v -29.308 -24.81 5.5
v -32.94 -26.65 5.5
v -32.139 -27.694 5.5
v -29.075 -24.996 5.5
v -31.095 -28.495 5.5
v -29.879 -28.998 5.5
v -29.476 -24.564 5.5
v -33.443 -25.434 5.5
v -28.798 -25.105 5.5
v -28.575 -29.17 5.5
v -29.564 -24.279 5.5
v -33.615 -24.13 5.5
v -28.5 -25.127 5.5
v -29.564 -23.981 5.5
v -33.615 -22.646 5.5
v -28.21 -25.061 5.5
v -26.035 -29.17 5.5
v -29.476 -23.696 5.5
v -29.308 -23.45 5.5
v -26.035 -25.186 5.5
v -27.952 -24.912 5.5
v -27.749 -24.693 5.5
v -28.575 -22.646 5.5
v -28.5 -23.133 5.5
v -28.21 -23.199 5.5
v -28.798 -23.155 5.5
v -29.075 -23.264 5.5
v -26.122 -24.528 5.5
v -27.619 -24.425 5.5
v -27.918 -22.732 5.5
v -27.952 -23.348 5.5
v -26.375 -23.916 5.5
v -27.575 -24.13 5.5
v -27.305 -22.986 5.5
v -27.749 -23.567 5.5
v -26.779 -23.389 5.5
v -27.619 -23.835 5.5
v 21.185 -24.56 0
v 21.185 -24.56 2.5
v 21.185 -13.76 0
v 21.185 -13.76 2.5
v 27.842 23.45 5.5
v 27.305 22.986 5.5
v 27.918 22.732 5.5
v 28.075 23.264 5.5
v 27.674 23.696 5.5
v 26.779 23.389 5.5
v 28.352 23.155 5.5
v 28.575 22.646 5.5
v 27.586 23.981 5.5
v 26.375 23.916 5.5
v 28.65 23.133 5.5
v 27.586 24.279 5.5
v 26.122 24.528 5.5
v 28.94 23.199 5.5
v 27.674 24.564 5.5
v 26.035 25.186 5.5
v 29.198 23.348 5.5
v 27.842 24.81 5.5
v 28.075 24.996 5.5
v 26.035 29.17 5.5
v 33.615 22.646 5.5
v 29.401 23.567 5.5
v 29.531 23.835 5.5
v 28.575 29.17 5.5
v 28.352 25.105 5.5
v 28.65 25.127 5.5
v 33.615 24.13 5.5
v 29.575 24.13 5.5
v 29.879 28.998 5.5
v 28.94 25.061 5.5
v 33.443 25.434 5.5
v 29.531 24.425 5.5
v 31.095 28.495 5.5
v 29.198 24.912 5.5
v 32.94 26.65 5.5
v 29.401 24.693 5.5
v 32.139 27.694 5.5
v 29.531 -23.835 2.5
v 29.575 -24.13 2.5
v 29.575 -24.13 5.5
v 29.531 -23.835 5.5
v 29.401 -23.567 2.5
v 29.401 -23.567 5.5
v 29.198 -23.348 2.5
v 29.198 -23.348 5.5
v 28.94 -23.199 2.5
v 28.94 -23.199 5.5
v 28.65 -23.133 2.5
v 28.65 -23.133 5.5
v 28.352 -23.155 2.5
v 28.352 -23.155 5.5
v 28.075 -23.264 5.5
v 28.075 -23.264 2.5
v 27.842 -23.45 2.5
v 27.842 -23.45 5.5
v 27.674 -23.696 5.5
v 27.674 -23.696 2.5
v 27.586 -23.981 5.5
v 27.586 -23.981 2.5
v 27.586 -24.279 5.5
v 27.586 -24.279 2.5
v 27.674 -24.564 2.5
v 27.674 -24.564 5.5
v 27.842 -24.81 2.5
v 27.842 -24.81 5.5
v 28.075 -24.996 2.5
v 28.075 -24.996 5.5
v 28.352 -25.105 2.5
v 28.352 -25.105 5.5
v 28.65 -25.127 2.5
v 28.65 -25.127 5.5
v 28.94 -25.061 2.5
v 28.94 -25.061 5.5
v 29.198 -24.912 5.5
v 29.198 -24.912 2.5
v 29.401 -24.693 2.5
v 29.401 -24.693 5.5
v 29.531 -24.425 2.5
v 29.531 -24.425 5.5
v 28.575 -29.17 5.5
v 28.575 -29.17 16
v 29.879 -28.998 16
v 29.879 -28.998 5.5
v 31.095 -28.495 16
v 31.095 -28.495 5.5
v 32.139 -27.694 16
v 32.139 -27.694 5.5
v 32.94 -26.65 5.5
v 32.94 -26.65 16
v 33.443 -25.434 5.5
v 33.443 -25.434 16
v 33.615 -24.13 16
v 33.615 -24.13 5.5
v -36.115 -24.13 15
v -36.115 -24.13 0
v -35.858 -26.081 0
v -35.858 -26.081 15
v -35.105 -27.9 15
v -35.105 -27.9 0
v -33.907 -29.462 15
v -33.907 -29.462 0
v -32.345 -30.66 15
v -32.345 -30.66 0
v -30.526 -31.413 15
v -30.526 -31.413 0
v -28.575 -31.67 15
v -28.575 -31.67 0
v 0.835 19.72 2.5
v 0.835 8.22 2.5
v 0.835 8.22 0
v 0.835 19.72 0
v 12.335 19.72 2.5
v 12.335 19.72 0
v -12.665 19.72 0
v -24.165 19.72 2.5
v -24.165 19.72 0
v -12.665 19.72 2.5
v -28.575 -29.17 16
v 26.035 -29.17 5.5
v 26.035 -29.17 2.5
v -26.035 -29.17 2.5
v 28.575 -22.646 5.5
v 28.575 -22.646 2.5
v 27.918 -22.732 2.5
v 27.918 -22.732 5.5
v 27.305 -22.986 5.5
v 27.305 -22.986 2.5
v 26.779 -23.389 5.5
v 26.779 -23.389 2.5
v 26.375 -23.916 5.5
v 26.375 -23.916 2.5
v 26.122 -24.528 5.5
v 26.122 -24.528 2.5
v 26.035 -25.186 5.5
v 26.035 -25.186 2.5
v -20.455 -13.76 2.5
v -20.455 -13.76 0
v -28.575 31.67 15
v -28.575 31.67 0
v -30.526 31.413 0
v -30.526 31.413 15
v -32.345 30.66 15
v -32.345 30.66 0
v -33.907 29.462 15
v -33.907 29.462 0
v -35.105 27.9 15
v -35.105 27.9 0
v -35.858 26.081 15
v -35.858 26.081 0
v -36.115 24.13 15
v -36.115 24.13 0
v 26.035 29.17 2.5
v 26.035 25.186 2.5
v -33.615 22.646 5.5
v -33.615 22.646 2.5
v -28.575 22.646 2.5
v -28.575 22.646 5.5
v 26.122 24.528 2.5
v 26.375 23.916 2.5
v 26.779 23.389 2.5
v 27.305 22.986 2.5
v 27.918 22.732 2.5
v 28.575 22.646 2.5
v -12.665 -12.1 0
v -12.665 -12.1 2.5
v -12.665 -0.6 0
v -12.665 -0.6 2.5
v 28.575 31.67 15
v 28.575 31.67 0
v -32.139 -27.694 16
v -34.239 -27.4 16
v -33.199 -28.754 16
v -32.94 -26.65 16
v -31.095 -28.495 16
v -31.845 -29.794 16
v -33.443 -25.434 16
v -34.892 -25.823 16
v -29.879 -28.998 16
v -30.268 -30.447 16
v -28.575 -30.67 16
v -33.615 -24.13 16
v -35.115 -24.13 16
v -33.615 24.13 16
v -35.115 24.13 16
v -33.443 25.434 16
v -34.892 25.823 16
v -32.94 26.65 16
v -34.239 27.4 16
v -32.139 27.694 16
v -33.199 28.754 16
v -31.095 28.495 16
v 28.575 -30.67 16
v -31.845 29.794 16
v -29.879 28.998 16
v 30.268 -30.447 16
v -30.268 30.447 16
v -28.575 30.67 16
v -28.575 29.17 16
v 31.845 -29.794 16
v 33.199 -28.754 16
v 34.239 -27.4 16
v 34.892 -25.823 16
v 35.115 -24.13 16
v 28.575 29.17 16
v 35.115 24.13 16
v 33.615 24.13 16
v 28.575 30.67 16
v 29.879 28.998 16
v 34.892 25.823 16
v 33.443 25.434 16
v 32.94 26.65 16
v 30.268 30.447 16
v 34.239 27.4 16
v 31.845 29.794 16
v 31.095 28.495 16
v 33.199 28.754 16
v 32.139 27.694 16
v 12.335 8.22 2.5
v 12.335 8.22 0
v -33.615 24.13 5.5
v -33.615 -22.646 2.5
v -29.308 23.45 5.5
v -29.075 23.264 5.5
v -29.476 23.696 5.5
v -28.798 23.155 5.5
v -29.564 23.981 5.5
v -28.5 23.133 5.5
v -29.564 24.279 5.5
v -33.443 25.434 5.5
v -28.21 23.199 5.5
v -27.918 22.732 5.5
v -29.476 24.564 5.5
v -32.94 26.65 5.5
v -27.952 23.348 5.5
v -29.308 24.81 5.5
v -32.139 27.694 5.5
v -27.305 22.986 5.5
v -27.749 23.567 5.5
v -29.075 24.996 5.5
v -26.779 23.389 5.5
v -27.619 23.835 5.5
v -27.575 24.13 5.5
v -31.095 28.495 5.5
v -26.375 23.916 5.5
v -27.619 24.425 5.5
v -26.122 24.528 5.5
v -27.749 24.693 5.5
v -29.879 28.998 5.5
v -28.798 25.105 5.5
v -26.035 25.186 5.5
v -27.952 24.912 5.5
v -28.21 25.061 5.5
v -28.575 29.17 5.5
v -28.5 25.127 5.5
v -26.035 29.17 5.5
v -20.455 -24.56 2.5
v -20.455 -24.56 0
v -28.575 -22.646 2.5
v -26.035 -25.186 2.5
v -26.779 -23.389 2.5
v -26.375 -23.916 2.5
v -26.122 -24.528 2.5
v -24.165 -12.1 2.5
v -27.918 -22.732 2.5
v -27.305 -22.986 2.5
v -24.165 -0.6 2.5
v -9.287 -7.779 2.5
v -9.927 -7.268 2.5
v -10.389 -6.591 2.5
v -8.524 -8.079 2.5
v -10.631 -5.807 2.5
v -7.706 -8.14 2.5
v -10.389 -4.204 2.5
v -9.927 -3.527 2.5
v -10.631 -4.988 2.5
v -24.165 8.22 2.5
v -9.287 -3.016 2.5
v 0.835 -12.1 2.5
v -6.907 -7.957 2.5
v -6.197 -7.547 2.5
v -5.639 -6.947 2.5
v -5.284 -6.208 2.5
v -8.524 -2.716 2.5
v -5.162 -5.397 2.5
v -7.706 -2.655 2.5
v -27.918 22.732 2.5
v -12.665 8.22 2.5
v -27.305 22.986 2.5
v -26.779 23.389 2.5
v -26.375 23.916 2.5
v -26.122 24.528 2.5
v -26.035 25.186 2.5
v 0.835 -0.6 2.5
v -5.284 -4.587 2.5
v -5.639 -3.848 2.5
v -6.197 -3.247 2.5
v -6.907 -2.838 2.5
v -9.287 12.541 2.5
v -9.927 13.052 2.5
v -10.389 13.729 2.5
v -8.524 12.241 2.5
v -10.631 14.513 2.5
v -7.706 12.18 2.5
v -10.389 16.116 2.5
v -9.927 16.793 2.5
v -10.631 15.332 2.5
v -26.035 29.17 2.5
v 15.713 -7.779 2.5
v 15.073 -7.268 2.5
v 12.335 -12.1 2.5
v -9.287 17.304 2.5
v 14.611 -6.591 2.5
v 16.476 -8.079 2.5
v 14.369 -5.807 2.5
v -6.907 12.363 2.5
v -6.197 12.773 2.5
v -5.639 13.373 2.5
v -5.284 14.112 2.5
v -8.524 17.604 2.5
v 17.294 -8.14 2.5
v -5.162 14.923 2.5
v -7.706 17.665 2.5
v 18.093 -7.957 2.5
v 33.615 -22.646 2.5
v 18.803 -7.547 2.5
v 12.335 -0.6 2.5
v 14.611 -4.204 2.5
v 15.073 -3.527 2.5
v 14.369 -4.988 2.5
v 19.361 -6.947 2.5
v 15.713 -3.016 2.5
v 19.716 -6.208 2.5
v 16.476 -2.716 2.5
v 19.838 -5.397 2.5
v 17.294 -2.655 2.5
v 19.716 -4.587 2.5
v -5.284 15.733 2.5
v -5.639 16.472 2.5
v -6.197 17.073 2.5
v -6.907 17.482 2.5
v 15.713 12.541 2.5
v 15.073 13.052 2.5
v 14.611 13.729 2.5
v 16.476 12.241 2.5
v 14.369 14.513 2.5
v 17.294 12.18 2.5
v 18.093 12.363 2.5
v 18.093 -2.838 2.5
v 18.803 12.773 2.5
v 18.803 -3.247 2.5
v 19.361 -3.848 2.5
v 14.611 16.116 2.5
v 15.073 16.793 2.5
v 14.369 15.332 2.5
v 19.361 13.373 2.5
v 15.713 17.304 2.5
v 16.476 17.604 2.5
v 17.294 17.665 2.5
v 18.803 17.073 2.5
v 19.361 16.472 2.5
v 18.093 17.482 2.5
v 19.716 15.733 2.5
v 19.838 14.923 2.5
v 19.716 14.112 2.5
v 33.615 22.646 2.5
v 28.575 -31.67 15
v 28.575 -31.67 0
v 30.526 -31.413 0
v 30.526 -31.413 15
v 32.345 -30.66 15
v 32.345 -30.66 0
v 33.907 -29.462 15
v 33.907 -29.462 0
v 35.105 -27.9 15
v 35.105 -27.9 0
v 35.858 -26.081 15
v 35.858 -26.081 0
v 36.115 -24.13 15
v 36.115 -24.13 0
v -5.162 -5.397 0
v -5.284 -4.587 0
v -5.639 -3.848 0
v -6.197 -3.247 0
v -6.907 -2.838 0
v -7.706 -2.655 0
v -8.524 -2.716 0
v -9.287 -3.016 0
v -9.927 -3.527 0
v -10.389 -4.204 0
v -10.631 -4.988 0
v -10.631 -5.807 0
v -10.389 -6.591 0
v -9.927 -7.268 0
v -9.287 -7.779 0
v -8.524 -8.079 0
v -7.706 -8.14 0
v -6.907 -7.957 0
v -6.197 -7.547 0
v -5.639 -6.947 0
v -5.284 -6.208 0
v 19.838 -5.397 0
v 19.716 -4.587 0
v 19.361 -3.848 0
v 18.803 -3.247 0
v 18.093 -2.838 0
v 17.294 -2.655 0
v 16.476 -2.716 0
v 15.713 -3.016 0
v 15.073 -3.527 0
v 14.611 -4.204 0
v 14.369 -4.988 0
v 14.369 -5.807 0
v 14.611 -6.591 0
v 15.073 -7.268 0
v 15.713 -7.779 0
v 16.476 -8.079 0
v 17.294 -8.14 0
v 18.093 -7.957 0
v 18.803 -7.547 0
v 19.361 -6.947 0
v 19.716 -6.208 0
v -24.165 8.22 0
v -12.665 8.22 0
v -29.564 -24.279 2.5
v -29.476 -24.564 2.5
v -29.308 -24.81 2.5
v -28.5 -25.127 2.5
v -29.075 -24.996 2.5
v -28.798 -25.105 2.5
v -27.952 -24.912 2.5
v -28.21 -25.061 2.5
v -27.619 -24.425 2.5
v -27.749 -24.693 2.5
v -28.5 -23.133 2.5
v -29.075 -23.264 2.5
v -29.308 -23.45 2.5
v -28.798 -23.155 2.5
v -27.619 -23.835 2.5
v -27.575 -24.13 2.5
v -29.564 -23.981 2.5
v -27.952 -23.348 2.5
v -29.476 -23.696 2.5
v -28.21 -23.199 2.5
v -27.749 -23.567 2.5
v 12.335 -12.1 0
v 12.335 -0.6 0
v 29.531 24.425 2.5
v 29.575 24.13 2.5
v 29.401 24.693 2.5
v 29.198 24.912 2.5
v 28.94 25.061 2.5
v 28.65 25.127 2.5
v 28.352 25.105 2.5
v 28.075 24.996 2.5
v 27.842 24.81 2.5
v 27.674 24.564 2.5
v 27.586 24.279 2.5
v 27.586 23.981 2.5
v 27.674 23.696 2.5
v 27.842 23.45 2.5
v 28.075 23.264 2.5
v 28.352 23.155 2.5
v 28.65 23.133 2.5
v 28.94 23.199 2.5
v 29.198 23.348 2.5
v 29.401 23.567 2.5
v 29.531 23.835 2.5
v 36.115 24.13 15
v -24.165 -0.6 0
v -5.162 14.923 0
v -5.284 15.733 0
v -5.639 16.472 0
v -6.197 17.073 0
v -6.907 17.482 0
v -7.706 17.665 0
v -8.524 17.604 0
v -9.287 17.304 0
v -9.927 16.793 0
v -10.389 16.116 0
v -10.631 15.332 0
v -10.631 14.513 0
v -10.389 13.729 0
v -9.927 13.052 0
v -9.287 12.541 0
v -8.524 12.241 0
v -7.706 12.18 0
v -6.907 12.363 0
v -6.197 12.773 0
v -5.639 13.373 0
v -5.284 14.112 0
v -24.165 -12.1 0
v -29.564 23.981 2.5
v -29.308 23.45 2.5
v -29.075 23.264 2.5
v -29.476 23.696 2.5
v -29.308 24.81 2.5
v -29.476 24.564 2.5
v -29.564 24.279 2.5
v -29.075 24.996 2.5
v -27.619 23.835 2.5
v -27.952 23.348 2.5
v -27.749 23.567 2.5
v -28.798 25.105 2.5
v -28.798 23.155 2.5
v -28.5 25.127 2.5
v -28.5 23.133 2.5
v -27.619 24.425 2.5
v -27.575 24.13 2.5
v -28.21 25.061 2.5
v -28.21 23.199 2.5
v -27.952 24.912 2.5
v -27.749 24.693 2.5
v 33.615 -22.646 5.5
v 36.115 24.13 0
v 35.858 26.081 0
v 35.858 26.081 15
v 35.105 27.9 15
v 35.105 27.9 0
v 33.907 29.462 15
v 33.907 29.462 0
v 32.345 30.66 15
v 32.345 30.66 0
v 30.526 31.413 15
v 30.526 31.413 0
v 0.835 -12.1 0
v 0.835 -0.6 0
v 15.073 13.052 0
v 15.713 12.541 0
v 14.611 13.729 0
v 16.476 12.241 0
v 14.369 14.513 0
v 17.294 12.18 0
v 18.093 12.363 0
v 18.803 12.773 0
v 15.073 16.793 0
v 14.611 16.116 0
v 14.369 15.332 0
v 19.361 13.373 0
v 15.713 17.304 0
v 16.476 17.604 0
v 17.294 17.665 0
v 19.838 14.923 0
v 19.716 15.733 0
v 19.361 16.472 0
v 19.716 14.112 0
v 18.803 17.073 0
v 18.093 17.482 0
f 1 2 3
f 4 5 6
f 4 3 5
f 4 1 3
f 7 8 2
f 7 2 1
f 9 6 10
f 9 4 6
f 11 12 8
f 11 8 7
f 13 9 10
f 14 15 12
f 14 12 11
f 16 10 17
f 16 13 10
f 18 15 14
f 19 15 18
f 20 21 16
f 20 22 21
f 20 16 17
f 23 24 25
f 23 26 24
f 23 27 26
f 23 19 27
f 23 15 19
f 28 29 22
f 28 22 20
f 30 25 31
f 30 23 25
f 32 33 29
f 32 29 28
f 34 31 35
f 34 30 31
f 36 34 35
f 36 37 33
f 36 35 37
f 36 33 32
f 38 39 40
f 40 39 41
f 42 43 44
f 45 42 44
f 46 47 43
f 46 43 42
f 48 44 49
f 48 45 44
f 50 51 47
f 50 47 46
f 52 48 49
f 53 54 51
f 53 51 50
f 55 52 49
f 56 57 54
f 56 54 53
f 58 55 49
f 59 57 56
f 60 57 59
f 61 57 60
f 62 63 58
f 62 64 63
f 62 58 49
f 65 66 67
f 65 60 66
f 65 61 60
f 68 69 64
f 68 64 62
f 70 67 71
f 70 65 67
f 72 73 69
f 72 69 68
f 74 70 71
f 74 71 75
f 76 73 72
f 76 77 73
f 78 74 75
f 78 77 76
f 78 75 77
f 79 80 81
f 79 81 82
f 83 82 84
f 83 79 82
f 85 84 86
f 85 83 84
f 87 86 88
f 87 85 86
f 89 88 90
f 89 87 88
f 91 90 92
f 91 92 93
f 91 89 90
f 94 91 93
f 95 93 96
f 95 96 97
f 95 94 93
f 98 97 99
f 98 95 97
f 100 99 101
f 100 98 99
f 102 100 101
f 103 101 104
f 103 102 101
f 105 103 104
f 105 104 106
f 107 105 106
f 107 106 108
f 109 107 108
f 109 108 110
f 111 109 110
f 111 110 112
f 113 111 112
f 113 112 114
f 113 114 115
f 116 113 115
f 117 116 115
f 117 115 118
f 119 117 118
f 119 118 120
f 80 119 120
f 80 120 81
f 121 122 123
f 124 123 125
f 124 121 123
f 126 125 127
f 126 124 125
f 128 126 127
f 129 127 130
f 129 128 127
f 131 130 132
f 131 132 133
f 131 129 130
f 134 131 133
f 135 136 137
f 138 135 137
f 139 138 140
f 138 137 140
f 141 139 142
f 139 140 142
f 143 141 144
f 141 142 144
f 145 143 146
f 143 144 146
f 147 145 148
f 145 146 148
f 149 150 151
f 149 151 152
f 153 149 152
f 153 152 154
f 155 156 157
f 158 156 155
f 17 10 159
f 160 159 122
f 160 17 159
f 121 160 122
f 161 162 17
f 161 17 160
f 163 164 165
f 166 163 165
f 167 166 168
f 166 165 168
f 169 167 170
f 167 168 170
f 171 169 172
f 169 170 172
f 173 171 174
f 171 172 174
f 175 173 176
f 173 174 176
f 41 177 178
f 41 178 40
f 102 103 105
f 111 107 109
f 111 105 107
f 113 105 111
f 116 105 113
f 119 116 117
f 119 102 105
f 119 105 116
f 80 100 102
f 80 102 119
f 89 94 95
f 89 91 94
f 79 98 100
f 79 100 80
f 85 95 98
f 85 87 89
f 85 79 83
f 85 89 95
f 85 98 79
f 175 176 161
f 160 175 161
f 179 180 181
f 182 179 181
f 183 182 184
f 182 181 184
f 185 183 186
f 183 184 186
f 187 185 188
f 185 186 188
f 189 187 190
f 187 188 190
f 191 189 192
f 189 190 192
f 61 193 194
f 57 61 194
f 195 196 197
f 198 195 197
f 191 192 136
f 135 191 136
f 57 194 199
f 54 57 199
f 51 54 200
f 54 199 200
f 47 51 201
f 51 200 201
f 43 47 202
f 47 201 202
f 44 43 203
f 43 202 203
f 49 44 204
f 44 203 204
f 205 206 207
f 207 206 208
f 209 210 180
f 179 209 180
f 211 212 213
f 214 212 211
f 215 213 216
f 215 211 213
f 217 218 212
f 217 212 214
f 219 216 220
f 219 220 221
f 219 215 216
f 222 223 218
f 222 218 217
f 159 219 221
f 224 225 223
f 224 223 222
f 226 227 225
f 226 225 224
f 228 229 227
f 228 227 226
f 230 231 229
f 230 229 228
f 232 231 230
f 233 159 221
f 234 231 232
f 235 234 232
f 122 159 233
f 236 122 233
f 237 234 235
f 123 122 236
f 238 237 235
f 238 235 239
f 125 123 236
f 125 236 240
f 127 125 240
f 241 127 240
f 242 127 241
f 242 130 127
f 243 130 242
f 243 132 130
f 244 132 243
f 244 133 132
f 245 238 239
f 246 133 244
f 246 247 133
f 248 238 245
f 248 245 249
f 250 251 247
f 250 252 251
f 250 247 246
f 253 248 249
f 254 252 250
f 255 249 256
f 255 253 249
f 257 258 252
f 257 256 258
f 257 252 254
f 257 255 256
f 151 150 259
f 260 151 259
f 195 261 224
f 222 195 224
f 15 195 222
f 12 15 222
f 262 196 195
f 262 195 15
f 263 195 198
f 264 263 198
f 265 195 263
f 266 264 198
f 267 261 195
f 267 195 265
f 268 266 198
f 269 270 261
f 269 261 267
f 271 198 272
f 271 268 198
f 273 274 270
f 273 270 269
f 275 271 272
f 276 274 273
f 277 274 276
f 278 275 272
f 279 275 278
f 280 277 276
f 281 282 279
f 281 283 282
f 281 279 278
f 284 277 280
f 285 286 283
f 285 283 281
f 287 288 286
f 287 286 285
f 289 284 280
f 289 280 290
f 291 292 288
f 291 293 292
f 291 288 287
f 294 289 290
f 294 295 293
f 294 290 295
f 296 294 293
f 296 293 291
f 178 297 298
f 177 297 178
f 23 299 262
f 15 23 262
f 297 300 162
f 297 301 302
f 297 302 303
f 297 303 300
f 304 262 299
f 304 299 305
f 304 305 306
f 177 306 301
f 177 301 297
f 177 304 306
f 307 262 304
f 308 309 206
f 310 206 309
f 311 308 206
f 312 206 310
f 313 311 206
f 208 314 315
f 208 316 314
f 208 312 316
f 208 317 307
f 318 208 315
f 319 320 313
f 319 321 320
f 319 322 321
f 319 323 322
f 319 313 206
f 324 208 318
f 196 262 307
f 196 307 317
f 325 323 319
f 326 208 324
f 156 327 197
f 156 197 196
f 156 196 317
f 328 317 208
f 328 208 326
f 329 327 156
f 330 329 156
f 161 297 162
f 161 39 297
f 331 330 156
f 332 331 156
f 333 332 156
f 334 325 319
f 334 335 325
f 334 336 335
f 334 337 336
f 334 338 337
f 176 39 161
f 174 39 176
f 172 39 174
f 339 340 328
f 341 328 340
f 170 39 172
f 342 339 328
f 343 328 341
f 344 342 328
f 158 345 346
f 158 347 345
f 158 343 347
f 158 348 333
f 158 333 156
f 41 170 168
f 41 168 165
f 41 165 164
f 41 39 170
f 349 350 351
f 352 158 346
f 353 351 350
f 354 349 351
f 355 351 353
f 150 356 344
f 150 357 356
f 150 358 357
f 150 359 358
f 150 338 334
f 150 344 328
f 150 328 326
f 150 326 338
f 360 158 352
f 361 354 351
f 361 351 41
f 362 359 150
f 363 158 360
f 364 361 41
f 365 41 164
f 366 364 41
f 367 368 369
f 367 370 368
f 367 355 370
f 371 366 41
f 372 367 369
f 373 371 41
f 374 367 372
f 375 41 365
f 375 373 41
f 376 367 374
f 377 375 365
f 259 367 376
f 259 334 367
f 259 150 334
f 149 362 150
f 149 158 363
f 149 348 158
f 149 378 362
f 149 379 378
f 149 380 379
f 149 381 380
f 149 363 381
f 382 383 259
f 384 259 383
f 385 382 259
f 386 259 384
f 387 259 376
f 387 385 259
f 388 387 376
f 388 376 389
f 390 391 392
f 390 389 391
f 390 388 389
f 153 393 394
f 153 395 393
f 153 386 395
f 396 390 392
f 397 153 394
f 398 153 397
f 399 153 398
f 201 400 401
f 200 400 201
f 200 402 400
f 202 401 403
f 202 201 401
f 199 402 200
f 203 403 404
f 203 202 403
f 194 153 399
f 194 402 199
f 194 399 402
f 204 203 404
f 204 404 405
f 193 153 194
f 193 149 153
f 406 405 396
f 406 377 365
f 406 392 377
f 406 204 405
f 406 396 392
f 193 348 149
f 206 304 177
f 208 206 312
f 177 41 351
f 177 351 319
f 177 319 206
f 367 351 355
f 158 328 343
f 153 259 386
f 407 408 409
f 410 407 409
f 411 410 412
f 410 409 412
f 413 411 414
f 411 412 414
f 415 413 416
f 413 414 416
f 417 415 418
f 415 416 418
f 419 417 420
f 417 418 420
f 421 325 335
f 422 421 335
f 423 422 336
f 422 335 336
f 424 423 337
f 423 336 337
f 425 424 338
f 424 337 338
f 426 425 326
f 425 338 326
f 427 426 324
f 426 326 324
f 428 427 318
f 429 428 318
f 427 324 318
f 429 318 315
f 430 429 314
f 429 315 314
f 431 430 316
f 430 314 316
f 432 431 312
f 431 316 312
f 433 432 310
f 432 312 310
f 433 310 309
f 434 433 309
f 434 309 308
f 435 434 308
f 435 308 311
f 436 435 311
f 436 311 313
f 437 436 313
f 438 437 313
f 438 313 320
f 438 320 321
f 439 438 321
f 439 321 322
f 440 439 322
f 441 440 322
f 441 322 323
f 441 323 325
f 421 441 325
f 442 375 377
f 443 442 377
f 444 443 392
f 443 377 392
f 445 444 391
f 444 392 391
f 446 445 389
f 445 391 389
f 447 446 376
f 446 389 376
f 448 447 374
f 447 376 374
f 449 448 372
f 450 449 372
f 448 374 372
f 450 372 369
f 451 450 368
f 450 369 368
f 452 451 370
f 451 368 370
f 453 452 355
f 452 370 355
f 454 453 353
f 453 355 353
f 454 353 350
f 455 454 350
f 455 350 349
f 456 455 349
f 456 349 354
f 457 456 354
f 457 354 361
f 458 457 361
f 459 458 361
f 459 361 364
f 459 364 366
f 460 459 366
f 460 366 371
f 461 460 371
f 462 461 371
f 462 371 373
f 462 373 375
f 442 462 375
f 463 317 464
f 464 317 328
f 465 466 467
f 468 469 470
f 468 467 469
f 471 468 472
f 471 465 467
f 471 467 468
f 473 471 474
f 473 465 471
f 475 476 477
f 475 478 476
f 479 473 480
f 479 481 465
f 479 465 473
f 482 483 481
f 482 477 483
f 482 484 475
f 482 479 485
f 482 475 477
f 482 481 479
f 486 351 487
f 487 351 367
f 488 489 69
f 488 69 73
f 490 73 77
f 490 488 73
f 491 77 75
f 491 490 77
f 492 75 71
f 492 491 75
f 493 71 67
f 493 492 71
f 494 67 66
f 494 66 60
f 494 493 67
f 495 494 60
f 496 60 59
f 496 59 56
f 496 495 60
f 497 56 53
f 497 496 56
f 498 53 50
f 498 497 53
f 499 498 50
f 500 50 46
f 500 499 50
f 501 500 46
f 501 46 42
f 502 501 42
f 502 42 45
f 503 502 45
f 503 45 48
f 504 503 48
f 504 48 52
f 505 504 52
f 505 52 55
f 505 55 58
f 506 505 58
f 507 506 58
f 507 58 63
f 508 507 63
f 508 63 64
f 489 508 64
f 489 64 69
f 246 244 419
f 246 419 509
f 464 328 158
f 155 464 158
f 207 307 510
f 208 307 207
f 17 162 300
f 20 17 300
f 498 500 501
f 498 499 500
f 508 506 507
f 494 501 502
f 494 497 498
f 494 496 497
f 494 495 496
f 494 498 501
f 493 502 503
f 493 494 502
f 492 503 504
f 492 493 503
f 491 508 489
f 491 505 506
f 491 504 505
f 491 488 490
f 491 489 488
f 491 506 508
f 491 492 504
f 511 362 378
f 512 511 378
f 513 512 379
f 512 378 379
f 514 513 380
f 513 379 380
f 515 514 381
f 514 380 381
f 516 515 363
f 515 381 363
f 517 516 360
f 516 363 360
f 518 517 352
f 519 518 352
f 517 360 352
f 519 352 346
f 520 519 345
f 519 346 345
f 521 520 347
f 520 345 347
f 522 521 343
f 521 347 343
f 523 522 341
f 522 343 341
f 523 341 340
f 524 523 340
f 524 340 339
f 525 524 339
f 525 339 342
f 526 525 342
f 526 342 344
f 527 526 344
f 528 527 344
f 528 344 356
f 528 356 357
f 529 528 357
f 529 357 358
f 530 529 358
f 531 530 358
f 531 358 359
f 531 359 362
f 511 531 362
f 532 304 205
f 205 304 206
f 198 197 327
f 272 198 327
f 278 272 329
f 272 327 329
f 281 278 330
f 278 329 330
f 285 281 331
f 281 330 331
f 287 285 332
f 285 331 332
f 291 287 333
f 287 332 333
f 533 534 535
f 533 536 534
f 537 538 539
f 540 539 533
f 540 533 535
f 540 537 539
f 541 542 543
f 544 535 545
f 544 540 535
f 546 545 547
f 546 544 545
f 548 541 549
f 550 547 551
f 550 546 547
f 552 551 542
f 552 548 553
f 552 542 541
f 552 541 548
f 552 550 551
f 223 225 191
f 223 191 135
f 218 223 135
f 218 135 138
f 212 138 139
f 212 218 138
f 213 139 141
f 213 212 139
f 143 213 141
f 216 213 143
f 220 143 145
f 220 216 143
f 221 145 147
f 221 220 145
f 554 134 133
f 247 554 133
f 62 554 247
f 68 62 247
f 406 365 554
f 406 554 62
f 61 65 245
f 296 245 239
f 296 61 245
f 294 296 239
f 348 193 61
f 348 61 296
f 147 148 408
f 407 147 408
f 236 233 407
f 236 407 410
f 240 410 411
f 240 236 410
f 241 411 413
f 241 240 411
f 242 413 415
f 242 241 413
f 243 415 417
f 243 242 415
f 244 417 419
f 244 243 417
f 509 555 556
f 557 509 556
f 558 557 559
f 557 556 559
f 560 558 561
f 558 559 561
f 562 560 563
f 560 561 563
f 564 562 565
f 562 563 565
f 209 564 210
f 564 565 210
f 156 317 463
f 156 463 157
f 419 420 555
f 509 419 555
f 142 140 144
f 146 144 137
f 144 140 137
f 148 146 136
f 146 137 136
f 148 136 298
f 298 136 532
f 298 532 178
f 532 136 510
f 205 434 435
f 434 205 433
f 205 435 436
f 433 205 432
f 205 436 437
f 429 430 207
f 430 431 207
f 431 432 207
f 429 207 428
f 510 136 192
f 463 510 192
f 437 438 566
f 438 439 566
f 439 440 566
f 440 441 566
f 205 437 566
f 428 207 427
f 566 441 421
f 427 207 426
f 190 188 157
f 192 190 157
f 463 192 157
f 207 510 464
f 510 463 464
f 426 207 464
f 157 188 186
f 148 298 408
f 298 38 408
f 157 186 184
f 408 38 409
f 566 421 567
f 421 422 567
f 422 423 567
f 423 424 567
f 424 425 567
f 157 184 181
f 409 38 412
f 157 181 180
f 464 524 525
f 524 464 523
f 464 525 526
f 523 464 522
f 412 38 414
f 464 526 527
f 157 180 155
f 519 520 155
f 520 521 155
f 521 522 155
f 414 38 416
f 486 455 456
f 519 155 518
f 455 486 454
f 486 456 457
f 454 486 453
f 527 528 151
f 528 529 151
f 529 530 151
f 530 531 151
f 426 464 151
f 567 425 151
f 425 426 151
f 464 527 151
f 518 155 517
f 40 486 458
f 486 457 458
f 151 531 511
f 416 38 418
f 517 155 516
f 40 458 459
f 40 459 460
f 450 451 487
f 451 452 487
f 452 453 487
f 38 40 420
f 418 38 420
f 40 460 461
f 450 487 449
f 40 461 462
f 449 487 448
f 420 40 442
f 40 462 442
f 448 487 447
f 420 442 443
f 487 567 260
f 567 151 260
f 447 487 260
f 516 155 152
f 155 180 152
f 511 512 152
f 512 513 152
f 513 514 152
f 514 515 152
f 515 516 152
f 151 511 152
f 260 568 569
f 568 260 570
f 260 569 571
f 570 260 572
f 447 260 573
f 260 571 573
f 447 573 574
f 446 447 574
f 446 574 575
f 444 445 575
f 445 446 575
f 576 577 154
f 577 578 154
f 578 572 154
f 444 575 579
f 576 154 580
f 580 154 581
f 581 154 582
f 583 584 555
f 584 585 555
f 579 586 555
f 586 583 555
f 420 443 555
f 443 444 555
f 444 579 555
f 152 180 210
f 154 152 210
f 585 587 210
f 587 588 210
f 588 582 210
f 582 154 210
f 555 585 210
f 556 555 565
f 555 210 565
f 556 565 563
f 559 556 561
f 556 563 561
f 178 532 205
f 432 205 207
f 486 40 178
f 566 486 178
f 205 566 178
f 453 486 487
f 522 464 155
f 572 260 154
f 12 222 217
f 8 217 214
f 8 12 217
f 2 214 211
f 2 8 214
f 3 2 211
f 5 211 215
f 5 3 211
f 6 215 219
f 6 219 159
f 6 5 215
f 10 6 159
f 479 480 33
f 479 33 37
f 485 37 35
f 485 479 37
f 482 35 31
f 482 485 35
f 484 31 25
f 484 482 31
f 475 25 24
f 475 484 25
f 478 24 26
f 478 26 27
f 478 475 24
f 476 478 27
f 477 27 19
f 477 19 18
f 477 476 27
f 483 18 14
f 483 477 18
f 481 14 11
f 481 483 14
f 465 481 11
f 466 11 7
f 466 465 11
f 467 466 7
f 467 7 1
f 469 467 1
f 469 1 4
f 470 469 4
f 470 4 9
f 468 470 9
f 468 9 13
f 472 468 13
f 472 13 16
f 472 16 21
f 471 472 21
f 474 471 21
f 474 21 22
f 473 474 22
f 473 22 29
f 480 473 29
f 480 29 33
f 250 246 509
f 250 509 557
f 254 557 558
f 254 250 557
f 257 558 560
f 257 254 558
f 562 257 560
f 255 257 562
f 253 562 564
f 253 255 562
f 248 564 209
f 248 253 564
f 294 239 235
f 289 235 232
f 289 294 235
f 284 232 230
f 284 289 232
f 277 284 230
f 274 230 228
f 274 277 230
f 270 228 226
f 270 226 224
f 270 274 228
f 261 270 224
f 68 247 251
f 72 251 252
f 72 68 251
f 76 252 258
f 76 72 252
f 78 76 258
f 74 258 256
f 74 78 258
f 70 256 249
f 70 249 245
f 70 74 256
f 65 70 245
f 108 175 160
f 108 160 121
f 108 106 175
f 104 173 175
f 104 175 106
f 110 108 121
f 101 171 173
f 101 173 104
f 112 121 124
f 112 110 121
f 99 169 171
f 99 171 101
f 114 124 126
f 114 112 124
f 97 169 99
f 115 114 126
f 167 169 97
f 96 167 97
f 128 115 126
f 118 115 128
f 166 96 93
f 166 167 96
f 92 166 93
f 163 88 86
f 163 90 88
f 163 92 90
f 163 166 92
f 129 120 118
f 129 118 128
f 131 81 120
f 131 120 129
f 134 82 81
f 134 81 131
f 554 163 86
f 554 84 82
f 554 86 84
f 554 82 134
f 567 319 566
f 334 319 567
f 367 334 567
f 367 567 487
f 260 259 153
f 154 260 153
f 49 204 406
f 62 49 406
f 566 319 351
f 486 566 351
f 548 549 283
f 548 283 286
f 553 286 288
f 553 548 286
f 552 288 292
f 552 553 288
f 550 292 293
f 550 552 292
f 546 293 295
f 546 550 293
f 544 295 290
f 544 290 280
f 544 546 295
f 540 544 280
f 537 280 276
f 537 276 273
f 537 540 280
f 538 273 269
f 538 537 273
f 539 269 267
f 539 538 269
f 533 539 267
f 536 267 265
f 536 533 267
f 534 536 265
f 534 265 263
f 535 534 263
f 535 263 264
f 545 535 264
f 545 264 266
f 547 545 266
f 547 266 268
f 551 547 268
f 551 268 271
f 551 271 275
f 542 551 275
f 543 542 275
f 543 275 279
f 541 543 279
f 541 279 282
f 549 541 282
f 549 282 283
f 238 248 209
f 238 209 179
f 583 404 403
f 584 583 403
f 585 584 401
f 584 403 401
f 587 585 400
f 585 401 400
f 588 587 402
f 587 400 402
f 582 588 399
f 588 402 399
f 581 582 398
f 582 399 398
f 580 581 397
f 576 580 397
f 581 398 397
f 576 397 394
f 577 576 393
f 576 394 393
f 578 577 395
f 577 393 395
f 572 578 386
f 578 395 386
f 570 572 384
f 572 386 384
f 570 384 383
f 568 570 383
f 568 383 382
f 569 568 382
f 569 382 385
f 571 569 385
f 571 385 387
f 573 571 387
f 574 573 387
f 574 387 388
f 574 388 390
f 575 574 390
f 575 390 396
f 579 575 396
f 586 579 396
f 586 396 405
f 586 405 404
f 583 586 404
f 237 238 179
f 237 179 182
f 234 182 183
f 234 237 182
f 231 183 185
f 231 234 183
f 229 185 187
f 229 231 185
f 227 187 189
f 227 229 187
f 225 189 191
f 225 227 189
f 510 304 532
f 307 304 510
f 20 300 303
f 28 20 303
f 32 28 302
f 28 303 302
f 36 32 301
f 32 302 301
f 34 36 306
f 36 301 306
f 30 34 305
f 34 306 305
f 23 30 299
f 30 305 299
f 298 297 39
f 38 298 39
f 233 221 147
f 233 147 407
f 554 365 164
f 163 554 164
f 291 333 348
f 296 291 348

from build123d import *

# Parameters (mm, degrees)
F0_R     = 1
F1_DEPTH = 16
F2_T     = -2.5
F3_DEPTH = 5.5
F4_W     = 41.64
F4_H     = 10.8
F4_R     = 2.75
F4_W_2   = 11.5
F4_H_2   = 11.5
F5_DEPTH = 2.501
F6_SIZE  = 1


with BuildPart() as f1:
    # F0 (on Top) → F1 (new body)
    with BuildSketch(Plane.XY):
        with BuildLine():
            ThreePointArc((36.115, 24.13), (33.906585, 29.461585), (28.575, 31.67))
            Line((28.575, 31.67), (26.035, 31.67))
            Line((26.035, 31.67), (26.035, 25.185541))
            ThreePointArc((26.035, 25.185541), (26.778949, 23.38949), (28.575, 22.645541))
            Line((28.575, 22.645541), (36.115, 22.645541))
            Line((36.115, 22.645541), (36.115, 24.13))
        make_face()
        with Locations((28.575, 24.13)):
            Circle(F0_R, mode=Mode.SUBTRACT)
        with BuildLine():
            Line((-26.035, 25.185541), (-26.035, 31.67))
            Line((-26.035, 31.67), (-28.575, 31.67))
            ThreePointArc((-28.575, 31.67), (-33.906585, 29.461585), (-36.115, 24.13))
            Line((-36.115, 24.13), (-36.115, 22.645541))
            Line((-36.115, 22.645541), (-28.575, 22.645541))
            ThreePointArc((-28.575, 22.645541), (-26.778949, 23.38949), (-26.035, 25.185541))
        make_face()
        with Locations((-28.575, 24.13)):
            Circle(F0_R, mode=Mode.SUBTRACT)
        with BuildLine():
            Line((36.115, -24.13), (36.115, -22.645541))
            Line((36.115, -22.645541), (28.575, -22.645541))
            ThreePointArc((28.575, -22.645541), (26.778949, -23.38949), (26.035, -25.185541))
            Line((26.035, -25.185541), (26.035, -31.67))
            Line((26.035, -31.67), (28.575, -31.67))
            ThreePointArc((28.575, -31.67), (33.906585, -29.461585), (36.115, -24.13))
        make_face()
        with Locations((28.575, -24.13)):
            Circle(F0_R, mode=Mode.SUBTRACT)
        with BuildLine():
            Line((-28.575, -22.645541), (-36.115, -22.645541))
            Line((-36.115, -22.645541), (-36.115, -24.13))
            ThreePointArc((-36.115, -24.13), (-33.906585, -29.461585), (-28.575, -31.67))
            Line((-28.575, -31.67), (-26.035, -31.67))
            Line((-26.035, -31.67), (-26.035, -25.185541))
            ThreePointArc((-26.035, -25.185541), (-26.778949, -23.38949), (-28.575, -22.645541))
        make_face()
        with Locations((-28.575, -24.13)):
            Circle(F0_R, mode=Mode.SUBTRACT)
        with BuildLine():
            Line((26.035, 25.185541), (26.035, 31.67))
            Line((26.035, 31.67), (-26.035, 31.67))
            Line((-26.035, 31.67), (-26.035, 25.185541))
            ThreePointArc((-26.035, 25.185541), (-26.778949, 23.38949), (-28.575, 22.645541))
            Line((-28.575, 22.645541), (-36.115, 22.645541))
            Line((-36.115, 22.645541), (-36.115, -22.645541))
            Line((-36.115, -22.645541), (-28.575, -22.645541))
            ThreePointArc((-28.575, -22.645541), (-26.778949, -23.38949), (-26.035, -25.185541))
            Line((-26.035, -25.185541), (-26.035, -31.67))
            Line((-26.035, -31.67), (26.035, -31.67))
            Line((26.035, -31.67), (26.035, -25.185541))
            ThreePointArc((26.035, -25.185541), (26.778949, -23.38949), (28.575, -22.645541))
            Line((28.575, -22.645541), (36.115, -22.645541))
            Line((36.115, -22.645541), (36.115, 22.645541))
            Line((36.115, 22.645541), (28.575, 22.645541))
            ThreePointArc((28.575, 22.645541), (26.778949, 23.38949), (26.035, 25.185541))
        make_face()
        with Locations((-28.575, 24.13)):
            Circle(F0_R)
        with Locations((28.575, 24.13)):
            Circle(F0_R)
        with Locations((28.575, -24.13)):
            Circle(F0_R)
        with Locations((-28.575, -24.13)):
            Circle(F0_R)
    extrude(amount=F1_DEPTH)

    # F2
    f2_openings = [f1.faces().sort_by_distance(p)[0] for p in [
        (0, 0, 16),
    ]]
    offset(amount=F2_T, openings=f2_openings)

    # F0 (on Top) → F3 (join)
    with BuildSketch(Plane.XY):
        with BuildLine():
            Line((-28.575, -22.645541), (-36.115, -22.645541))
            Line((-36.115, -22.645541), (-36.115, -24.13))
            ThreePointArc((-36.115, -24.13), (-33.906585, -29.461585), (-28.575, -31.67))
            Line((-28.575, -31.67), (-26.035, -31.67))
            Line((-26.035, -31.67), (-26.035, -25.185541))
            ThreePointArc((-26.035, -25.185541), (-26.778949, -23.38949), (-28.575, -22.645541))
        make_face()
        with Locations((-28.575, -24.13)):
            Circle(F0_R, mode=Mode.SUBTRACT)
        with BuildLine():
            Line((36.115, -24.13), (36.115, -22.645541))
            Line((36.115, -22.645541), (28.575, -22.645541))
            ThreePointArc((28.575, -22.645541), (26.778949, -23.38949), (26.035, -25.185541))
            Line((26.035, -25.185541), (26.035, -31.67))
            Line((26.035, -31.67), (28.575, -31.67))
            ThreePointArc((28.575, -31.67), (33.906585, -29.461585), (36.115, -24.13))
        make_face()
        with Locations((28.575, -24.13)):
            Circle(F0_R, mode=Mode.SUBTRACT)
        with BuildLine():
            ThreePointArc((36.115, 24.13), (33.906585, 29.461585), (28.575, 31.67))
            Line((28.575, 31.67), (26.035, 31.67))
            Line((26.035, 31.67), (26.035, 25.185541))
            ThreePointArc((26.035, 25.185541), (26.778949, 23.38949), (28.575, 22.645541))
            Line((28.575, 22.645541), (36.115, 22.645541))
            Line((36.115, 22.645541), (36.115, 24.13))
        make_face()
        with Locations((28.575, 24.13)):
            Circle(F0_R, mode=Mode.SUBTRACT)
        with BuildLine():
            Line((-26.035, 25.185541), (-26.035, 31.67))
            Line((-26.035, 31.67), (-28.575, 31.67))
            ThreePointArc((-28.575, 31.67), (-33.906585, 29.461585), (-36.115, 24.13))
            Line((-36.115, 24.13), (-36.115, 22.645541))
            Line((-36.115, 22.645541), (-28.575, 22.645541))
            ThreePointArc((-28.575, 22.645541), (-26.778949, 23.38949), (-26.035, 25.185541))
        make_face()
        with Locations((-28.575, 24.13)):
            Circle(F0_R, mode=Mode.SUBTRACT)
    extrude(amount=F3_DEPTH)

    # F4 (on face) → F5 (cut, through all)
    with BuildSketch(Plane.XY.offset(2.5)):
        with Locations((0.365, -19.16)):
            Rectangle(F4_W, F4_H)
        with Locations((17.088419, -5.397456)):
            Circle(F4_R)
        with Locations((6.585, 13.97)):
            Rectangle(F4_W_2, F4_H_2)
        with Locations((17.088419, 14.922544)):
            Circle(F4_R)
        with Locations((6.585, -6.35)):
            Rectangle(F4_W_2, F4_H_2)
        with Locations((-18.415, -6.35)):
            Rectangle(F4_W_2, F4_H_2)
        with Locations((-7.911581, -5.397456)):
            Circle(F4_R)
        with Locations((-18.415, 13.97)):
            Rectangle(F4_W_2, F4_H_2)
        with Locations((-7.911581, 14.922544)):
            Circle(F4_R)
    extrude(amount=-F5_DEPTH, mode=Mode.SUBTRACT)

    # F6
    f6_edges = [f1.edges().sort_by_distance(p)[0] for p in [
        (36.115, 0, 16),
    ]]
    chamfer(f6_edges, length=F6_SIZE)


solid = f1.part
